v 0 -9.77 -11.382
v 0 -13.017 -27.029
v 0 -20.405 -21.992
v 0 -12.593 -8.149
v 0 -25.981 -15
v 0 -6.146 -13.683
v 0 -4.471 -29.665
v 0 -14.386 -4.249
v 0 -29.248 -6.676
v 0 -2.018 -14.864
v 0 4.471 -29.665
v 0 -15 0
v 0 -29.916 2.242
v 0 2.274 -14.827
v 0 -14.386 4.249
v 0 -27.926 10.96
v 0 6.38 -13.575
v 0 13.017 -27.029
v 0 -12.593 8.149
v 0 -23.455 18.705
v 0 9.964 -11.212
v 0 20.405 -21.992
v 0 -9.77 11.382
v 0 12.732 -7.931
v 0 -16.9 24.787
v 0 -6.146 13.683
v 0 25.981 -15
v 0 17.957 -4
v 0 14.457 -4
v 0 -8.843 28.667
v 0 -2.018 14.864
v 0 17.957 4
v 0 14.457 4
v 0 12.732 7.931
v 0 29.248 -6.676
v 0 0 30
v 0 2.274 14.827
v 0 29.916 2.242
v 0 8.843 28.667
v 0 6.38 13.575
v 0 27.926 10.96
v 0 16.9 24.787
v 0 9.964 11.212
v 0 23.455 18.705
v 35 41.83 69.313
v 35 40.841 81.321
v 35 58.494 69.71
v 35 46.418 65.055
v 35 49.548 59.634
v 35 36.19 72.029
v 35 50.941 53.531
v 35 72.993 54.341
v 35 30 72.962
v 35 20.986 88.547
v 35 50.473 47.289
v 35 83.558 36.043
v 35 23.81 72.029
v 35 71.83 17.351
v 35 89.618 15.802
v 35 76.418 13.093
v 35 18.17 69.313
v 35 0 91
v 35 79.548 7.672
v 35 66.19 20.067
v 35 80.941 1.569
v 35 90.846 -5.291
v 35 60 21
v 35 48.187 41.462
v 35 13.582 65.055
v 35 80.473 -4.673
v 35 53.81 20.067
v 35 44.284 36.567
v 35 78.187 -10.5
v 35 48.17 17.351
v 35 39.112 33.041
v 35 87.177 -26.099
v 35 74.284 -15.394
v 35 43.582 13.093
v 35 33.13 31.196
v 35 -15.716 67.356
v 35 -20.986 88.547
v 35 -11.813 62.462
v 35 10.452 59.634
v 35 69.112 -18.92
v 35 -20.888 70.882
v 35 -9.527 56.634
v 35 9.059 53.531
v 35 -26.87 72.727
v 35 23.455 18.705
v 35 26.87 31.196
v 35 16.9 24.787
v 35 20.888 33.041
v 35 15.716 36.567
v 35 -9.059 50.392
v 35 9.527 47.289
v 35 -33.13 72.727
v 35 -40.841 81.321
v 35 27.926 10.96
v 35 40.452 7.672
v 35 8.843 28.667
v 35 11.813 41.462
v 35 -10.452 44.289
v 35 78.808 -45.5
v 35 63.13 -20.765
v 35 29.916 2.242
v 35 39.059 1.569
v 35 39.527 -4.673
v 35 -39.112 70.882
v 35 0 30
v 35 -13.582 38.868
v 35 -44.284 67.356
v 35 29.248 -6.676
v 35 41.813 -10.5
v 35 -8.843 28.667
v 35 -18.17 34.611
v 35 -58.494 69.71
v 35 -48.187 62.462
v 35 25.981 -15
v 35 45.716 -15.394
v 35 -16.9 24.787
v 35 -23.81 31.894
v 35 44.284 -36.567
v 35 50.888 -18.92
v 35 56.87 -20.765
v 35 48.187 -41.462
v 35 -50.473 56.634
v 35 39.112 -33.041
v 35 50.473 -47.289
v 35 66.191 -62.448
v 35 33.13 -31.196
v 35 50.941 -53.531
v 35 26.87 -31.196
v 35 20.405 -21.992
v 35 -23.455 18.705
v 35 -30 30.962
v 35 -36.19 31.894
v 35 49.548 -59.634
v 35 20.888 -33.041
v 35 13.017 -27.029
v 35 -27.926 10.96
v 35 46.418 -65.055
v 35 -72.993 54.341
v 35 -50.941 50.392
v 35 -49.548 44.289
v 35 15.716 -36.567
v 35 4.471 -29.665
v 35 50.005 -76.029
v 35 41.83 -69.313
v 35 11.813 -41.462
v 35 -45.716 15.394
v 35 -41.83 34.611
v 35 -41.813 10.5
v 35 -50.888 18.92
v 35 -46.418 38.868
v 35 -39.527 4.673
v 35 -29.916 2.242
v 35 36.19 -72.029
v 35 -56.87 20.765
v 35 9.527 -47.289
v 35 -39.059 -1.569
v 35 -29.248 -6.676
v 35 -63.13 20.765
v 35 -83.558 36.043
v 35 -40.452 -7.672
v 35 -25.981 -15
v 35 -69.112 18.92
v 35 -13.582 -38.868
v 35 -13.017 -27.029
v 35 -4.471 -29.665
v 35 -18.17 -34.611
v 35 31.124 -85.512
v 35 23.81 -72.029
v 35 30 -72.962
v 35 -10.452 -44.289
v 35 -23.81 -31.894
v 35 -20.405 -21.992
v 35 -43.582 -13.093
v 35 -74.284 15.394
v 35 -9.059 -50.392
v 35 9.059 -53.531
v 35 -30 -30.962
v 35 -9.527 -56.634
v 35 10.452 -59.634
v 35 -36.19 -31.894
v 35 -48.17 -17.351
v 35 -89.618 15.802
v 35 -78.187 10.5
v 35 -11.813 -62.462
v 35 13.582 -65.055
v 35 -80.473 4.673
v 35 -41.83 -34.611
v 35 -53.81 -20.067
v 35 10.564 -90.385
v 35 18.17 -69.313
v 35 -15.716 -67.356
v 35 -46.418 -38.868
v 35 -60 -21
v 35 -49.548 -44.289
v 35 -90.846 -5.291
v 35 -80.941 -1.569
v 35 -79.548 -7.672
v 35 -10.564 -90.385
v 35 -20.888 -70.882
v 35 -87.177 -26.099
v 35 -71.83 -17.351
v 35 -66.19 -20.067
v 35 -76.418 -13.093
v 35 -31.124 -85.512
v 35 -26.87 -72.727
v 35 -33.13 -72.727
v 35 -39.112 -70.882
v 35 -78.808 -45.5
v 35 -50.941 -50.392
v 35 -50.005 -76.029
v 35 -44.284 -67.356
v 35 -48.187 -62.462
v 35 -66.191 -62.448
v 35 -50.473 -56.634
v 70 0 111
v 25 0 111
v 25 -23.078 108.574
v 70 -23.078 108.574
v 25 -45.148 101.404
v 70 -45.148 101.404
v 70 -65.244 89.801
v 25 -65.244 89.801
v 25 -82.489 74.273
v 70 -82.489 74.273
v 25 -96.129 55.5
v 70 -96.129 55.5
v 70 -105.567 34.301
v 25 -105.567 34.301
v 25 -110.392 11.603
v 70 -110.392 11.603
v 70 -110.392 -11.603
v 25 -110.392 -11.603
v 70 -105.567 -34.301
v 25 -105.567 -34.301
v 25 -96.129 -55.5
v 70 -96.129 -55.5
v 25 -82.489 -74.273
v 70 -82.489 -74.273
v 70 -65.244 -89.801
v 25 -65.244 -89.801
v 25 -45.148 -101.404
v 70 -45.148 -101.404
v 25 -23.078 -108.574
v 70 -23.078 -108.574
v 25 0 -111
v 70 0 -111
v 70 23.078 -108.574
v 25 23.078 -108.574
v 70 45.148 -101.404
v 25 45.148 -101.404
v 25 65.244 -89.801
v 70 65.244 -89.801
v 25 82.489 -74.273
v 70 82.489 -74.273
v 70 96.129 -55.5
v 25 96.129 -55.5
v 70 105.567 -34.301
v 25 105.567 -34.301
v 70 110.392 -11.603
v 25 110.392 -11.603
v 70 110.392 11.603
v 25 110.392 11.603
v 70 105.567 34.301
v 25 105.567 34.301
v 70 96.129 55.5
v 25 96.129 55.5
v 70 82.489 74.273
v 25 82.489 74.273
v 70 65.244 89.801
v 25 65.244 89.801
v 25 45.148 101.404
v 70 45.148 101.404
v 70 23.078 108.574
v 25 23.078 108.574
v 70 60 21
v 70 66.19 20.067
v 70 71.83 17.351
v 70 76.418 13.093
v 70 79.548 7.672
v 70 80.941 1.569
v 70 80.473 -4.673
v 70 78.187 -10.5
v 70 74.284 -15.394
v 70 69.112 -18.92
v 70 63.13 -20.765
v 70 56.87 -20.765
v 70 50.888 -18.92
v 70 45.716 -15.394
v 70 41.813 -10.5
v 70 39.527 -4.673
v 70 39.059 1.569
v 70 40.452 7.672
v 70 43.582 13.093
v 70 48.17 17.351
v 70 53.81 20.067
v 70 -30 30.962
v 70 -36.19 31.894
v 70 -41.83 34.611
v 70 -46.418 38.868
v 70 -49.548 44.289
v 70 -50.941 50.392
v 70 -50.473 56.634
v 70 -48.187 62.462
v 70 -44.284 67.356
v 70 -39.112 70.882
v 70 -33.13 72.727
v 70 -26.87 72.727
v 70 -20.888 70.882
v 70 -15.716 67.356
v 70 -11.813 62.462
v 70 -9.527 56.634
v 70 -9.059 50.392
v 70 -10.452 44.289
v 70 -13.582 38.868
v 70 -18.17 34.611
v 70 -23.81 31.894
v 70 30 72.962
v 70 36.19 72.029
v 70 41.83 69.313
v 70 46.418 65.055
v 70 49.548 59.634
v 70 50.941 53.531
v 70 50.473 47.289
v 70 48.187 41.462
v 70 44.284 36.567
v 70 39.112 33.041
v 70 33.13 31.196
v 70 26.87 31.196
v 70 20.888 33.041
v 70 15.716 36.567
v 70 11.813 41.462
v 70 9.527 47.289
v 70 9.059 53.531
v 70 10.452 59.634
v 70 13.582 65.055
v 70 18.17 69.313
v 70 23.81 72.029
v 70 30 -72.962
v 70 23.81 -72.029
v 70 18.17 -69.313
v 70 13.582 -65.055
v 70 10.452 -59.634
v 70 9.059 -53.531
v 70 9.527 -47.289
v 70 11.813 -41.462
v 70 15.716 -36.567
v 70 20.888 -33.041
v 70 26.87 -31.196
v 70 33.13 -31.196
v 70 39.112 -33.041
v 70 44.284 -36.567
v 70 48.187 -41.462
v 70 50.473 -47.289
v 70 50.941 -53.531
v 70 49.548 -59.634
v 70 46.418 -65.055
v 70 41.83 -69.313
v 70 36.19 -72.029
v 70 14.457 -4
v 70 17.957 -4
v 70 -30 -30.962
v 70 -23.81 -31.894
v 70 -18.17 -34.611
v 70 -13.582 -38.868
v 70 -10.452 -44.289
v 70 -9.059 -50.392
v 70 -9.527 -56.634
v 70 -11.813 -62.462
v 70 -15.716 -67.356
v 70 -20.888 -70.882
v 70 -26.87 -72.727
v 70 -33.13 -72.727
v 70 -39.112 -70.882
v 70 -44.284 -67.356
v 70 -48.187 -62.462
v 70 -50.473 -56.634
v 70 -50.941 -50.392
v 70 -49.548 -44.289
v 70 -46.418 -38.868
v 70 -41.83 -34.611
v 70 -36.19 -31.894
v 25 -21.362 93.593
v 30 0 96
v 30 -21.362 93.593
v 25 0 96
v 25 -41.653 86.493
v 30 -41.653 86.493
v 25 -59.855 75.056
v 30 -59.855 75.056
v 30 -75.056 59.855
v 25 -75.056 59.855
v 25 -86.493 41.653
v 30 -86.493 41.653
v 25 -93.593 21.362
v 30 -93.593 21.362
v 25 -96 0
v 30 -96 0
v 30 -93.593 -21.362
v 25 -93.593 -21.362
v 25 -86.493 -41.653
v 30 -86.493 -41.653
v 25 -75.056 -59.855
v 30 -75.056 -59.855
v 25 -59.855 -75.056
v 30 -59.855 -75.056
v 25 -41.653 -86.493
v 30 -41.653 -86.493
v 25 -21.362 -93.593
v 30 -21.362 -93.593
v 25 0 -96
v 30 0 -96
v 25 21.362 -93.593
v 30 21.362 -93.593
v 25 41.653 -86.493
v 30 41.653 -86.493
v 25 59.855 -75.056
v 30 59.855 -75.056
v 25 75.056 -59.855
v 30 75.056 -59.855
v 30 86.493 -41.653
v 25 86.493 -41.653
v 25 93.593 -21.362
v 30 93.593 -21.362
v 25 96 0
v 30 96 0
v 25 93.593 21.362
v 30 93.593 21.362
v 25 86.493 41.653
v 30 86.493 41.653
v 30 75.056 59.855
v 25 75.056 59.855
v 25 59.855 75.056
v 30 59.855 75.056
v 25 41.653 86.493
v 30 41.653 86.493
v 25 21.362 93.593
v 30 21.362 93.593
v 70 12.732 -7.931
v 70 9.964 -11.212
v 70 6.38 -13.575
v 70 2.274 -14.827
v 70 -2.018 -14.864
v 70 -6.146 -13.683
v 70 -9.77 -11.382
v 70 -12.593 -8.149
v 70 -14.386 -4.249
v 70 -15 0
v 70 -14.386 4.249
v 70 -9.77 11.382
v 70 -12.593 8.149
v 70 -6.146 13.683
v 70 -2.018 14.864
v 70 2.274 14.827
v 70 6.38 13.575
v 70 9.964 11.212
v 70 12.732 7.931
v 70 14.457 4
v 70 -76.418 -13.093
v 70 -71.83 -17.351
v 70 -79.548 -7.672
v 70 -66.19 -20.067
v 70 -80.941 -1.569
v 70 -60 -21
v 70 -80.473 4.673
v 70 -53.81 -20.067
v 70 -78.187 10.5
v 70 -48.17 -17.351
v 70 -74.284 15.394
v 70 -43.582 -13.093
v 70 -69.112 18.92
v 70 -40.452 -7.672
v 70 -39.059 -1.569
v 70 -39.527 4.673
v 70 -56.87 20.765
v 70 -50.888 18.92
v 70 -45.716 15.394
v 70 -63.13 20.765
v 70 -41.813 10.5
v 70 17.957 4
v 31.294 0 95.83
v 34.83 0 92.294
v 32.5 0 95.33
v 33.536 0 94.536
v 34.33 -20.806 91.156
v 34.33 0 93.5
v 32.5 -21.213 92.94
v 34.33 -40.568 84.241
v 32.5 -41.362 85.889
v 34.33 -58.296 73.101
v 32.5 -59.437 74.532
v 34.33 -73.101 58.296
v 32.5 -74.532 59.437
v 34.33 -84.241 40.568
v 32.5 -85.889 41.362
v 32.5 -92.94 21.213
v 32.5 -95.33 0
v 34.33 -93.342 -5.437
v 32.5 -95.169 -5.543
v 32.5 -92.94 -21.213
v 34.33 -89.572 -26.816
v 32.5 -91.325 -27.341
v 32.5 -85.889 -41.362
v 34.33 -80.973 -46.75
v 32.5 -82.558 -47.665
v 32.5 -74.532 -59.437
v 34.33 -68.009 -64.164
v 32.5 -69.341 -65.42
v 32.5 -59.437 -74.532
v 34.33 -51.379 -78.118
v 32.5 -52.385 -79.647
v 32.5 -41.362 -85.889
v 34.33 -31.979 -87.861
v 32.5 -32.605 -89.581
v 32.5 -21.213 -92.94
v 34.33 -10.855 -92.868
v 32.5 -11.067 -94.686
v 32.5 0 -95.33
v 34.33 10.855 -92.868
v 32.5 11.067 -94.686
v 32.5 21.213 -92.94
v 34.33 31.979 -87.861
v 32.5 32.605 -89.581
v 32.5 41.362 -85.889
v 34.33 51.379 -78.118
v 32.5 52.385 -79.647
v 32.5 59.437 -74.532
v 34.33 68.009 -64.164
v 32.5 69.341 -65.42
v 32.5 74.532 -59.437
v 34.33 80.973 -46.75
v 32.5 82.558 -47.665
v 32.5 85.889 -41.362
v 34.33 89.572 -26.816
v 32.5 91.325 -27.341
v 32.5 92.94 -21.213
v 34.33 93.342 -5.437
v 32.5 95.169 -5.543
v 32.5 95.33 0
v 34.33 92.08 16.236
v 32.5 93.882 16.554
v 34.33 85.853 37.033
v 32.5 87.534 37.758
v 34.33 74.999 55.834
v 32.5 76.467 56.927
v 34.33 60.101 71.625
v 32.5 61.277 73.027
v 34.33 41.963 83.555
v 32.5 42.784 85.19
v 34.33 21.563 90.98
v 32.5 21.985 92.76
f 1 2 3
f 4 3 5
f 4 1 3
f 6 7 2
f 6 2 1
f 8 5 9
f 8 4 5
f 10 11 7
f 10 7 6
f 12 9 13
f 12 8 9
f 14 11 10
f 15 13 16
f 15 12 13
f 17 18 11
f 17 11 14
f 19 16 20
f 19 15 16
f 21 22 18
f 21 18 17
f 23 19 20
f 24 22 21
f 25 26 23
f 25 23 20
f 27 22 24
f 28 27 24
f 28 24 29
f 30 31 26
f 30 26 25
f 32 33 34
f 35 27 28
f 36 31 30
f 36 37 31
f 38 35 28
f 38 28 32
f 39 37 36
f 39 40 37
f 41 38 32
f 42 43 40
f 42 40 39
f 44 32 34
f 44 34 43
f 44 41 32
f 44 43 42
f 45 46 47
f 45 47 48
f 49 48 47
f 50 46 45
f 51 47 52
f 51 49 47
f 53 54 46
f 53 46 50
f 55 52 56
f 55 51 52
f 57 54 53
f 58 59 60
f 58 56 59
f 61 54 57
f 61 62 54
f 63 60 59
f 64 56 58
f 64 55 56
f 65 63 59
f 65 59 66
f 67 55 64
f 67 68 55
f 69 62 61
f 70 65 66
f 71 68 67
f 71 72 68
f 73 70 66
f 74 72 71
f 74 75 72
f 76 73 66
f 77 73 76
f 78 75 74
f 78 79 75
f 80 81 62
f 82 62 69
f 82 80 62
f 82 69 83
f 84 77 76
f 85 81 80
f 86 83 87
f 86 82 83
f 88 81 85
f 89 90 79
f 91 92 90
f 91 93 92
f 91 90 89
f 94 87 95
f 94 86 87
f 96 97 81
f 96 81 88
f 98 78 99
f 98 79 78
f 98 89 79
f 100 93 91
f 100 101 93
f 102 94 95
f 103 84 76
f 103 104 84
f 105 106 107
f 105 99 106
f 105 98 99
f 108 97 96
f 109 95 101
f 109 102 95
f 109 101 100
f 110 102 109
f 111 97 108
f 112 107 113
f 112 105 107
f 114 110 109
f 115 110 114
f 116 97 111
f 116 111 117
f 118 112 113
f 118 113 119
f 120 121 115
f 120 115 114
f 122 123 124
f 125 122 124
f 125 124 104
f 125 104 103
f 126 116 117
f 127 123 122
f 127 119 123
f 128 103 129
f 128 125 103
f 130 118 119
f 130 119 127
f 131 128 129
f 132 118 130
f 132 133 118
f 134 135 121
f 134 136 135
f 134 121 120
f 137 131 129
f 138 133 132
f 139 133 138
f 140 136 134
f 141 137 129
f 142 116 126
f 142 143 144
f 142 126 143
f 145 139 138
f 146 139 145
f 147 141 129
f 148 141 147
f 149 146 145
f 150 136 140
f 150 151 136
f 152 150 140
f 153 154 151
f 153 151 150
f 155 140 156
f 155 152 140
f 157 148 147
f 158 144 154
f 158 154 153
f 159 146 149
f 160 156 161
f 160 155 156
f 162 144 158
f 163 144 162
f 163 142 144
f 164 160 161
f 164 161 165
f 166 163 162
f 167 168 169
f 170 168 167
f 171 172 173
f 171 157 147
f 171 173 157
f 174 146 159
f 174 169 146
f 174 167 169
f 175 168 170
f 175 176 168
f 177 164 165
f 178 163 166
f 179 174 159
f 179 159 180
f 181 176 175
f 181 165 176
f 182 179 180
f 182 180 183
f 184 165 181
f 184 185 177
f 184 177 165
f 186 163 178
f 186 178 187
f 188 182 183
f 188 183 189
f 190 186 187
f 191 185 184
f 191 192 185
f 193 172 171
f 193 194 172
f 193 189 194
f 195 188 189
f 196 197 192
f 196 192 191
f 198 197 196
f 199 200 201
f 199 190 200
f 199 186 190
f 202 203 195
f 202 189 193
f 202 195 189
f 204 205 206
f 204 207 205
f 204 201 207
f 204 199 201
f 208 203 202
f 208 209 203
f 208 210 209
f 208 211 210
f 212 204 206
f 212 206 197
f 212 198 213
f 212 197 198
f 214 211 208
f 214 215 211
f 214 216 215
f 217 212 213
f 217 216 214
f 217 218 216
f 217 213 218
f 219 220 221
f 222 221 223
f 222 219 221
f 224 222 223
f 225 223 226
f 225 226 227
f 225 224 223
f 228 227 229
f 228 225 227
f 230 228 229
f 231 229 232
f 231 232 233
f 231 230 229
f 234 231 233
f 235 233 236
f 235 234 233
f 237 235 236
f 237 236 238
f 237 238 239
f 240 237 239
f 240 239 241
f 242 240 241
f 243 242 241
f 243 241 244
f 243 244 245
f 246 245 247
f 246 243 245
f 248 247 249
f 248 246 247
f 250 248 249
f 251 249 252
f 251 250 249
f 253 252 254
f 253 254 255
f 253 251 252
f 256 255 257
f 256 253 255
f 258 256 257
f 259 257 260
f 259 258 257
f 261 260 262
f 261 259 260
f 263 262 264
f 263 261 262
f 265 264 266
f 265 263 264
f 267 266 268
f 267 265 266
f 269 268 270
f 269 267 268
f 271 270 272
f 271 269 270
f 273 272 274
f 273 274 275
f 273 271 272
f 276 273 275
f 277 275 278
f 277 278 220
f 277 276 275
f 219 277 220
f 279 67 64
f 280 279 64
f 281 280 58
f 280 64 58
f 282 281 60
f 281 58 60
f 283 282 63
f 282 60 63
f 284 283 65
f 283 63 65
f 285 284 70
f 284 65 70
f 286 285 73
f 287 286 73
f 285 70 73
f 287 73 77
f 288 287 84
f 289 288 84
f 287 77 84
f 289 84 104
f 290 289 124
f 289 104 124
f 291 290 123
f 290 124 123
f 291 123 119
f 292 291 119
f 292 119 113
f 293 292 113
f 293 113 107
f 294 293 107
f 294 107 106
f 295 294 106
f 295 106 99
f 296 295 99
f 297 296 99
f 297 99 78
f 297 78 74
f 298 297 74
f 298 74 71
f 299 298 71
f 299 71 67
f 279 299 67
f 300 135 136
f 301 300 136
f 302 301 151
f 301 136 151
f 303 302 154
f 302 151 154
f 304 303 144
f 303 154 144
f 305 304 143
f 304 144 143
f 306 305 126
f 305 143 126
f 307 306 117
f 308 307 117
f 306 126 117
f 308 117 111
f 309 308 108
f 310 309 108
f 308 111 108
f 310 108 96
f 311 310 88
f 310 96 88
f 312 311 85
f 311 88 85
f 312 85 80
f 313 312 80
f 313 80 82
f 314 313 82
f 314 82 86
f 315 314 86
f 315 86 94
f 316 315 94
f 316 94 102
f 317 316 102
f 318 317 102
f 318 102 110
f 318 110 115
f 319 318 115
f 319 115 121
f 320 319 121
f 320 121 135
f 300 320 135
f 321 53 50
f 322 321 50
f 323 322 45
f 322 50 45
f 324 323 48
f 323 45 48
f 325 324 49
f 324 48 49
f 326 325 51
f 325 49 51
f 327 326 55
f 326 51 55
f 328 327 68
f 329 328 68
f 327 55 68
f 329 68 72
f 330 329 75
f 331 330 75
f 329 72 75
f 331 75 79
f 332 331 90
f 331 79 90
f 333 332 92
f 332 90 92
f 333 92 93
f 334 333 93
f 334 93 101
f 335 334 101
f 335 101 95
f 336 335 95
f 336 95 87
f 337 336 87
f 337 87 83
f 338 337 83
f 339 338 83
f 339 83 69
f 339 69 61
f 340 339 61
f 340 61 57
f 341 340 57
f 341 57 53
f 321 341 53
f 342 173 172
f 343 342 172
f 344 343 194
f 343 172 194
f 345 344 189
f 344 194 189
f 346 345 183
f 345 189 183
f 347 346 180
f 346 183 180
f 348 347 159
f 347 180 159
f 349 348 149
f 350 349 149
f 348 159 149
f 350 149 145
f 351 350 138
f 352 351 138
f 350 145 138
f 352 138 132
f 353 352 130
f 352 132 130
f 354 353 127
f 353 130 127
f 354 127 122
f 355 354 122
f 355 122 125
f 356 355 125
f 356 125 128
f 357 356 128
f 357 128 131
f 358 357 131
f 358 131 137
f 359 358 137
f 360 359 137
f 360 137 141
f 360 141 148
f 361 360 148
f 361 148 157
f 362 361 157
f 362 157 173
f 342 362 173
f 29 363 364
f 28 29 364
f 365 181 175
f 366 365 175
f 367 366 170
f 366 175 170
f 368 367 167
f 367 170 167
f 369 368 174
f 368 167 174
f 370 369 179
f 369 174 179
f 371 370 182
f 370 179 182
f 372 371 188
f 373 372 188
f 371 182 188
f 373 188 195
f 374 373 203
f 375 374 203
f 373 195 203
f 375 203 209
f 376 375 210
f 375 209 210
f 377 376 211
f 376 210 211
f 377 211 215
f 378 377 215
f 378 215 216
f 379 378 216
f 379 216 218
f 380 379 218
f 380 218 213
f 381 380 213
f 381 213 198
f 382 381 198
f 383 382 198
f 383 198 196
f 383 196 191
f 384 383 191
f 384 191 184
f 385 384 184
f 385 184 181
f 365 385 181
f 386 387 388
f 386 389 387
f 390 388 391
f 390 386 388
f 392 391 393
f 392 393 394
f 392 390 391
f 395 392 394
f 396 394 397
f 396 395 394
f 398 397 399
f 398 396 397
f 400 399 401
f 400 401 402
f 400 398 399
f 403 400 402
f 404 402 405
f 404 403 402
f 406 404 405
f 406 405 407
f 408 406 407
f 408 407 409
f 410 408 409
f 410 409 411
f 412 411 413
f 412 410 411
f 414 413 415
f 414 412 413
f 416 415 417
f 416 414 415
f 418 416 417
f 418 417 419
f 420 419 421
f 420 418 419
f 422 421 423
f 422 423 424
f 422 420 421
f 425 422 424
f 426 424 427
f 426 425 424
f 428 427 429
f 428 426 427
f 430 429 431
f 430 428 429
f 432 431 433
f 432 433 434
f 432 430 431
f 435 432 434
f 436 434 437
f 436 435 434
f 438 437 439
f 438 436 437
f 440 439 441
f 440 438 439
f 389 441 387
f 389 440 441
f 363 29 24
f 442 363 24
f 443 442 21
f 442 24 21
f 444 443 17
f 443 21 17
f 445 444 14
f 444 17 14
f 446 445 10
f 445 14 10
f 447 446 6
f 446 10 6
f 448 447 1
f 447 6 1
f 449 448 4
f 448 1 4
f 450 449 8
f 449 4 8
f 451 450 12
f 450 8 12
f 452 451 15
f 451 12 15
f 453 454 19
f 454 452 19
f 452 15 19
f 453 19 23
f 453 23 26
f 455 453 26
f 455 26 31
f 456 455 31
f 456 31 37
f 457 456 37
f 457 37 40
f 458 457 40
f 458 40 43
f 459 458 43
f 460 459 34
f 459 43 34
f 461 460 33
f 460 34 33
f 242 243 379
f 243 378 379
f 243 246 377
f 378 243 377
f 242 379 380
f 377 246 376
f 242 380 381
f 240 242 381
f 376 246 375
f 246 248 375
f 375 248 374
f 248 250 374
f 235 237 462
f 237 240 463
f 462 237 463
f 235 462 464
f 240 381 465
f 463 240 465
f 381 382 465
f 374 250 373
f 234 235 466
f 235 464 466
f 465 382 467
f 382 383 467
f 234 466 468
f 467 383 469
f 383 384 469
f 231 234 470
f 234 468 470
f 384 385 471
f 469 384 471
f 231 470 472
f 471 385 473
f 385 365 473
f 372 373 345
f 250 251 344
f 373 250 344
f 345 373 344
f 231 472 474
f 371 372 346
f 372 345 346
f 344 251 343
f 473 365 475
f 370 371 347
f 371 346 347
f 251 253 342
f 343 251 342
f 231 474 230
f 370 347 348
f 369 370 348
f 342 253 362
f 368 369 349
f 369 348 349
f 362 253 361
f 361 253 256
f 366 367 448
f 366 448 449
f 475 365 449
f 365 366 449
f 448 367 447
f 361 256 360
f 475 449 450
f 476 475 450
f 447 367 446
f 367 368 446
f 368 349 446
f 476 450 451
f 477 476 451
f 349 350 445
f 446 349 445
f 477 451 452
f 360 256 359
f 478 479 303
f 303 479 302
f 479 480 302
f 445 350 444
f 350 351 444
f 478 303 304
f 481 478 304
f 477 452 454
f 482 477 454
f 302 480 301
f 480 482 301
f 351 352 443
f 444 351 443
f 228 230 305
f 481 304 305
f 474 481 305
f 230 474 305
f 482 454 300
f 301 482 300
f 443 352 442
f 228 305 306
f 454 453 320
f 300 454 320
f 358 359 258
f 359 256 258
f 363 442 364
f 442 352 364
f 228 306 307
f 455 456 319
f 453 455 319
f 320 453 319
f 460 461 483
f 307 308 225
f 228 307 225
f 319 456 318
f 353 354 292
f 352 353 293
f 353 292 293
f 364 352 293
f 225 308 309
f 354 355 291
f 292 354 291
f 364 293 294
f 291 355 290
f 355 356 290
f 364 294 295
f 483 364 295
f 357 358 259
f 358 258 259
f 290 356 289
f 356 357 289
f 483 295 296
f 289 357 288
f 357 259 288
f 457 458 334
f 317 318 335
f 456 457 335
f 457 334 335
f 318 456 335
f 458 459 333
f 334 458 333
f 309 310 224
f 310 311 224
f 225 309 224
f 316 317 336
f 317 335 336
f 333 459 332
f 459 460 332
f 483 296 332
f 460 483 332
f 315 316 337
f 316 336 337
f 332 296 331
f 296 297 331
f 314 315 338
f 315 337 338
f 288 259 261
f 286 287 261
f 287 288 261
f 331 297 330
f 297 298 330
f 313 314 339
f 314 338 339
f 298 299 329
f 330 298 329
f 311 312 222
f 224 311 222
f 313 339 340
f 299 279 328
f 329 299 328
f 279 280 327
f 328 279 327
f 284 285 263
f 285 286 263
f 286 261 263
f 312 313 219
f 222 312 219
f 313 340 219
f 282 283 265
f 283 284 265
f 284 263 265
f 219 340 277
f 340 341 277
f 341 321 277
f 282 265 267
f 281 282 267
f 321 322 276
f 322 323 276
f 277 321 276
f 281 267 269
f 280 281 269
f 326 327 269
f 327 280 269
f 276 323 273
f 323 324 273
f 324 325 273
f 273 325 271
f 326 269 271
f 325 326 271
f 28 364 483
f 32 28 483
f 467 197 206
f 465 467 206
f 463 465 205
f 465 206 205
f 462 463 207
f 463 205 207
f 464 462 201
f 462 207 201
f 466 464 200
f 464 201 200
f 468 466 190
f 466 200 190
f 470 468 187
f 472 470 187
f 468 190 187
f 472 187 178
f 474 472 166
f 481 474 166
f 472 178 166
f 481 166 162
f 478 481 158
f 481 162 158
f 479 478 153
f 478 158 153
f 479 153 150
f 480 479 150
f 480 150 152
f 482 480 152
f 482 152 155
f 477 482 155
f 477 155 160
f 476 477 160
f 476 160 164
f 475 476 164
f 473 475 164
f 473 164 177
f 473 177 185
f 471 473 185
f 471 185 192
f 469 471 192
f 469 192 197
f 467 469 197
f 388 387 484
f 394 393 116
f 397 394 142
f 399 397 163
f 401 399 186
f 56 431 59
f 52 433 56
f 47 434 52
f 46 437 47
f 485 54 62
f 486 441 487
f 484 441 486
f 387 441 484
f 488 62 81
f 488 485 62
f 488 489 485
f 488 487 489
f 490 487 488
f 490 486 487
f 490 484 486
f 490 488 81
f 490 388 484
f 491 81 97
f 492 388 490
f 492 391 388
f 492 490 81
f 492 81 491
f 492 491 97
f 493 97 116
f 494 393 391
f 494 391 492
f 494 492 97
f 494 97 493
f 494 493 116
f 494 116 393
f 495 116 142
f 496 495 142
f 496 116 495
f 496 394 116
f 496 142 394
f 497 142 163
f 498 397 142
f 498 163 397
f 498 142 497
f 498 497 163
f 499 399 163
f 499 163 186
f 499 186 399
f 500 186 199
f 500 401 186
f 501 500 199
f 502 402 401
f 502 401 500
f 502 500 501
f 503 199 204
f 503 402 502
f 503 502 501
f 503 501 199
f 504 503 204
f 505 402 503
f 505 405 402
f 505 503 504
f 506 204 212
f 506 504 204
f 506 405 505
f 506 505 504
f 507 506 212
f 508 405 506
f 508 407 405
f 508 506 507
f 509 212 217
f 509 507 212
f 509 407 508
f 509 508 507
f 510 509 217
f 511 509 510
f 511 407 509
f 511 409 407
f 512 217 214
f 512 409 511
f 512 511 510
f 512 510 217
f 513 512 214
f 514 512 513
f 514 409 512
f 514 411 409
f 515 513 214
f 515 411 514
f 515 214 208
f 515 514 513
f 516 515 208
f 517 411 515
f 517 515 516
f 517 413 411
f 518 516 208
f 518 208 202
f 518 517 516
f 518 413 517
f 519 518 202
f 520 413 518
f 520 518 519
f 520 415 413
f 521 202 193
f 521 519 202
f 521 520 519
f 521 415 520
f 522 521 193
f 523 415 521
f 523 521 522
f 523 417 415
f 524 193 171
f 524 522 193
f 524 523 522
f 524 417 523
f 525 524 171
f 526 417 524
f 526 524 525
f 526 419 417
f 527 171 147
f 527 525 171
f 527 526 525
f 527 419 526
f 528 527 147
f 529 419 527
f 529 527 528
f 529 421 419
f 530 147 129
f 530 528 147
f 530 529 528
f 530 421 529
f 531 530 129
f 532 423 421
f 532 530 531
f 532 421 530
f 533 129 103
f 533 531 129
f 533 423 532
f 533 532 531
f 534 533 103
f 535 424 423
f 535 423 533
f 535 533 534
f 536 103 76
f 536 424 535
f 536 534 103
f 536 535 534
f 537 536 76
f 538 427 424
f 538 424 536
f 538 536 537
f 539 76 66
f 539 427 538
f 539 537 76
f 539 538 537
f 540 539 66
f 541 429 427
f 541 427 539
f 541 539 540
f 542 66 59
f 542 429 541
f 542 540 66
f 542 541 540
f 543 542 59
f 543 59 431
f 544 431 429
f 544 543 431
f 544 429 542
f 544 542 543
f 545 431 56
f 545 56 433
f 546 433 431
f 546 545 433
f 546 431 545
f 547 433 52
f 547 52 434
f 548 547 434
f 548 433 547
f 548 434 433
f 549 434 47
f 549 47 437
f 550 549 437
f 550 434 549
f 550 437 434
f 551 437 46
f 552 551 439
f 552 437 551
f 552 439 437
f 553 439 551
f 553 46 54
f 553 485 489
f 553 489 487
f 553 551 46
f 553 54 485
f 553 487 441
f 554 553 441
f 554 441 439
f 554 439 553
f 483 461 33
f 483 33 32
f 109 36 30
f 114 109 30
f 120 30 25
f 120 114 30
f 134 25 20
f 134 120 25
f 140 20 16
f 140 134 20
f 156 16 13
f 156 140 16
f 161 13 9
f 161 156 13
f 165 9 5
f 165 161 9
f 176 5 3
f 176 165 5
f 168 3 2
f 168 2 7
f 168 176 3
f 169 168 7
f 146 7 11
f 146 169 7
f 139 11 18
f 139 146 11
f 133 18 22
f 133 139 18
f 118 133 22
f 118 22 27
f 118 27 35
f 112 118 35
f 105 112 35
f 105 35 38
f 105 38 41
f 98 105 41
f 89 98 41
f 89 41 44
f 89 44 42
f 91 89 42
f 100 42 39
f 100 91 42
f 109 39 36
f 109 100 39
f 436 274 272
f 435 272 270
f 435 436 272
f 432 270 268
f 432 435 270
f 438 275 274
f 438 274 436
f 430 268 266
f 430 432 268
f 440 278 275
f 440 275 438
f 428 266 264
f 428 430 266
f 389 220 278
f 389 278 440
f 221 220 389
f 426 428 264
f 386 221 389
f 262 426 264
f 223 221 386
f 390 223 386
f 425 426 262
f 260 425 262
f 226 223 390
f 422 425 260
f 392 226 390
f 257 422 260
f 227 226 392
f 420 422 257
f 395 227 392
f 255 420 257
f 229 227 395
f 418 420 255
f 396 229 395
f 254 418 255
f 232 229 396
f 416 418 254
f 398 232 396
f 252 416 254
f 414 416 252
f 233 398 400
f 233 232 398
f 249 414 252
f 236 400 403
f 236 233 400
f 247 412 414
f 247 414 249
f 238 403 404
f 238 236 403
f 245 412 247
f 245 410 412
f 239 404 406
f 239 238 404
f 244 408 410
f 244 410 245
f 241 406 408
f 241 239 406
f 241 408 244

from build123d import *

# Parameters (mm, degrees)
CUT_EXTRUDE1_DEPTH  = 172.877863613
SKETCH4_R           = 21
CUT_EXTRUDE3_DEPTH  = 161.832210704
SKETCH5_W           = 8
SKETCH5_H           = 3.5
BOSS_EXTRUDE1_DEPTH = 70
SKETCH6_R           = 15
CUT_EXTRUDE4_DEPTH  = 172.877863613
SKETCH7_W           = 8
SKETCH7_H           = 7
CUT_EXTRUDE5_DEPTH  = 172.877863613
SKETCH8_W           = 8
SKETCH8_H           = 0.543167705
BOSS_EXTRUDE2_DEPTH = 70


with BuildPart() as part:
    # Sketch1 → Revolve1 (revolve)
    with BuildSketch(Plane(origin=(0, 0, 0), x_dir=(1, 0, 0), z_dir=(0, 1, 0)), mode=Mode.PRIVATE) as revolve1_sk:
        with BuildLine():
            Line((0, 0), (0, 30))
            Line((0, 30), (35, 30))
            Line((35, 30), (35, 91))
            ThreePointArc((35, 91), (33.535533906, 94.535533906), (30, 96))
            Line((30, 96), (25, 96))
            Line((25, 96), (25, 111))
            Line((25, 111), (70, 111))
            Line((70, 111), (70, 0))
            Line((70, 0), (0, 0))
        make_face()
    revolve(revolve1_sk.sketch.rotate(Axis((-137.76, 0, 0), (1, 0, 0)), 180), axis=Axis((-137.76, 0, 0), (1, 0, 0)))

    # Sketch2 → Cut-Extrude1 (cut, through all)
    with BuildSketch(Plane.ZY):
        with BuildLine():
            Line((-4, 10.494049493), (-4, 17.494049493))
            Line((-4, 17.494049493), (4, 17.494049493))
            Line((4, 17.494049493), (4, 10.494049493))
            ThreePointArc((4, 10.494049493), (0, -11.230542051), (-4, 10.494049493))
        make_face()
    extrude(amount=-CUT_EXTRUDE1_DEPTH, mode=Mode.SUBTRACT)

    # Sketch4 → Cut-Extrude3 (cut, through all)
    with BuildSketch(Plane.ZY.offset(-35)):
        with Locations((0, 60)):
            Circle(SKETCH4_R)
        with Locations((51.961524227, 30)):
            Circle(SKETCH4_R)
        with Locations(Location((-51.961524227, 30, 0), (0, 0, 180))):
            Circle(SKETCH4_R)
        with Locations(Location((51.961524227, -30, 0), (0, 0, 180))):
            Circle(SKETCH4_R)
        with Locations(Location((0, -60, 0), (0, 0, 180))):
            Circle(SKETCH4_R)
        with Locations((-51.961524227, -30)):
            Circle(SKETCH4_R)
    extrude(amount=-CUT_EXTRUDE3_DEPTH, mode=Mode.SUBTRACT)

    # Sketch5 → Boss-Extrude1 (add)
    with BuildSketch(Plane.ZY):
        with Locations((0, 15.744049493)):
            Rectangle(SKETCH5_W, SKETCH5_H)
    extrude(amount=-BOSS_EXTRUDE1_DEPTH)

    # Sketch6 → Cut-Extrude4 (cut, through all)
    with BuildSketch(Plane.ZY):
        Circle(SKETCH6_R)
    extrude(amount=-CUT_EXTRUDE4_DEPTH, mode=Mode.SUBTRACT)

    # Sketch7 → Cut-Extrude5 (cut, through all)
    with BuildSketch(Plane.ZY):
        with Locations((0, 15)):
            Rectangle(SKETCH7_W, SKETCH7_H)
    extrude(amount=-CUT_EXTRUDE5_DEPTH, mode=Mode.SUBTRACT)

    # Sketch8 → Boss-Extrude2 (add)
    with BuildSketch(Plane.ZY):
        with Locations((0, 18.228416147)):
            Rectangle(SKETCH8_W, SKETCH8_H)
    extrude(amount=-BOSS_EXTRUDE2_DEPTH)


solid = part.part
